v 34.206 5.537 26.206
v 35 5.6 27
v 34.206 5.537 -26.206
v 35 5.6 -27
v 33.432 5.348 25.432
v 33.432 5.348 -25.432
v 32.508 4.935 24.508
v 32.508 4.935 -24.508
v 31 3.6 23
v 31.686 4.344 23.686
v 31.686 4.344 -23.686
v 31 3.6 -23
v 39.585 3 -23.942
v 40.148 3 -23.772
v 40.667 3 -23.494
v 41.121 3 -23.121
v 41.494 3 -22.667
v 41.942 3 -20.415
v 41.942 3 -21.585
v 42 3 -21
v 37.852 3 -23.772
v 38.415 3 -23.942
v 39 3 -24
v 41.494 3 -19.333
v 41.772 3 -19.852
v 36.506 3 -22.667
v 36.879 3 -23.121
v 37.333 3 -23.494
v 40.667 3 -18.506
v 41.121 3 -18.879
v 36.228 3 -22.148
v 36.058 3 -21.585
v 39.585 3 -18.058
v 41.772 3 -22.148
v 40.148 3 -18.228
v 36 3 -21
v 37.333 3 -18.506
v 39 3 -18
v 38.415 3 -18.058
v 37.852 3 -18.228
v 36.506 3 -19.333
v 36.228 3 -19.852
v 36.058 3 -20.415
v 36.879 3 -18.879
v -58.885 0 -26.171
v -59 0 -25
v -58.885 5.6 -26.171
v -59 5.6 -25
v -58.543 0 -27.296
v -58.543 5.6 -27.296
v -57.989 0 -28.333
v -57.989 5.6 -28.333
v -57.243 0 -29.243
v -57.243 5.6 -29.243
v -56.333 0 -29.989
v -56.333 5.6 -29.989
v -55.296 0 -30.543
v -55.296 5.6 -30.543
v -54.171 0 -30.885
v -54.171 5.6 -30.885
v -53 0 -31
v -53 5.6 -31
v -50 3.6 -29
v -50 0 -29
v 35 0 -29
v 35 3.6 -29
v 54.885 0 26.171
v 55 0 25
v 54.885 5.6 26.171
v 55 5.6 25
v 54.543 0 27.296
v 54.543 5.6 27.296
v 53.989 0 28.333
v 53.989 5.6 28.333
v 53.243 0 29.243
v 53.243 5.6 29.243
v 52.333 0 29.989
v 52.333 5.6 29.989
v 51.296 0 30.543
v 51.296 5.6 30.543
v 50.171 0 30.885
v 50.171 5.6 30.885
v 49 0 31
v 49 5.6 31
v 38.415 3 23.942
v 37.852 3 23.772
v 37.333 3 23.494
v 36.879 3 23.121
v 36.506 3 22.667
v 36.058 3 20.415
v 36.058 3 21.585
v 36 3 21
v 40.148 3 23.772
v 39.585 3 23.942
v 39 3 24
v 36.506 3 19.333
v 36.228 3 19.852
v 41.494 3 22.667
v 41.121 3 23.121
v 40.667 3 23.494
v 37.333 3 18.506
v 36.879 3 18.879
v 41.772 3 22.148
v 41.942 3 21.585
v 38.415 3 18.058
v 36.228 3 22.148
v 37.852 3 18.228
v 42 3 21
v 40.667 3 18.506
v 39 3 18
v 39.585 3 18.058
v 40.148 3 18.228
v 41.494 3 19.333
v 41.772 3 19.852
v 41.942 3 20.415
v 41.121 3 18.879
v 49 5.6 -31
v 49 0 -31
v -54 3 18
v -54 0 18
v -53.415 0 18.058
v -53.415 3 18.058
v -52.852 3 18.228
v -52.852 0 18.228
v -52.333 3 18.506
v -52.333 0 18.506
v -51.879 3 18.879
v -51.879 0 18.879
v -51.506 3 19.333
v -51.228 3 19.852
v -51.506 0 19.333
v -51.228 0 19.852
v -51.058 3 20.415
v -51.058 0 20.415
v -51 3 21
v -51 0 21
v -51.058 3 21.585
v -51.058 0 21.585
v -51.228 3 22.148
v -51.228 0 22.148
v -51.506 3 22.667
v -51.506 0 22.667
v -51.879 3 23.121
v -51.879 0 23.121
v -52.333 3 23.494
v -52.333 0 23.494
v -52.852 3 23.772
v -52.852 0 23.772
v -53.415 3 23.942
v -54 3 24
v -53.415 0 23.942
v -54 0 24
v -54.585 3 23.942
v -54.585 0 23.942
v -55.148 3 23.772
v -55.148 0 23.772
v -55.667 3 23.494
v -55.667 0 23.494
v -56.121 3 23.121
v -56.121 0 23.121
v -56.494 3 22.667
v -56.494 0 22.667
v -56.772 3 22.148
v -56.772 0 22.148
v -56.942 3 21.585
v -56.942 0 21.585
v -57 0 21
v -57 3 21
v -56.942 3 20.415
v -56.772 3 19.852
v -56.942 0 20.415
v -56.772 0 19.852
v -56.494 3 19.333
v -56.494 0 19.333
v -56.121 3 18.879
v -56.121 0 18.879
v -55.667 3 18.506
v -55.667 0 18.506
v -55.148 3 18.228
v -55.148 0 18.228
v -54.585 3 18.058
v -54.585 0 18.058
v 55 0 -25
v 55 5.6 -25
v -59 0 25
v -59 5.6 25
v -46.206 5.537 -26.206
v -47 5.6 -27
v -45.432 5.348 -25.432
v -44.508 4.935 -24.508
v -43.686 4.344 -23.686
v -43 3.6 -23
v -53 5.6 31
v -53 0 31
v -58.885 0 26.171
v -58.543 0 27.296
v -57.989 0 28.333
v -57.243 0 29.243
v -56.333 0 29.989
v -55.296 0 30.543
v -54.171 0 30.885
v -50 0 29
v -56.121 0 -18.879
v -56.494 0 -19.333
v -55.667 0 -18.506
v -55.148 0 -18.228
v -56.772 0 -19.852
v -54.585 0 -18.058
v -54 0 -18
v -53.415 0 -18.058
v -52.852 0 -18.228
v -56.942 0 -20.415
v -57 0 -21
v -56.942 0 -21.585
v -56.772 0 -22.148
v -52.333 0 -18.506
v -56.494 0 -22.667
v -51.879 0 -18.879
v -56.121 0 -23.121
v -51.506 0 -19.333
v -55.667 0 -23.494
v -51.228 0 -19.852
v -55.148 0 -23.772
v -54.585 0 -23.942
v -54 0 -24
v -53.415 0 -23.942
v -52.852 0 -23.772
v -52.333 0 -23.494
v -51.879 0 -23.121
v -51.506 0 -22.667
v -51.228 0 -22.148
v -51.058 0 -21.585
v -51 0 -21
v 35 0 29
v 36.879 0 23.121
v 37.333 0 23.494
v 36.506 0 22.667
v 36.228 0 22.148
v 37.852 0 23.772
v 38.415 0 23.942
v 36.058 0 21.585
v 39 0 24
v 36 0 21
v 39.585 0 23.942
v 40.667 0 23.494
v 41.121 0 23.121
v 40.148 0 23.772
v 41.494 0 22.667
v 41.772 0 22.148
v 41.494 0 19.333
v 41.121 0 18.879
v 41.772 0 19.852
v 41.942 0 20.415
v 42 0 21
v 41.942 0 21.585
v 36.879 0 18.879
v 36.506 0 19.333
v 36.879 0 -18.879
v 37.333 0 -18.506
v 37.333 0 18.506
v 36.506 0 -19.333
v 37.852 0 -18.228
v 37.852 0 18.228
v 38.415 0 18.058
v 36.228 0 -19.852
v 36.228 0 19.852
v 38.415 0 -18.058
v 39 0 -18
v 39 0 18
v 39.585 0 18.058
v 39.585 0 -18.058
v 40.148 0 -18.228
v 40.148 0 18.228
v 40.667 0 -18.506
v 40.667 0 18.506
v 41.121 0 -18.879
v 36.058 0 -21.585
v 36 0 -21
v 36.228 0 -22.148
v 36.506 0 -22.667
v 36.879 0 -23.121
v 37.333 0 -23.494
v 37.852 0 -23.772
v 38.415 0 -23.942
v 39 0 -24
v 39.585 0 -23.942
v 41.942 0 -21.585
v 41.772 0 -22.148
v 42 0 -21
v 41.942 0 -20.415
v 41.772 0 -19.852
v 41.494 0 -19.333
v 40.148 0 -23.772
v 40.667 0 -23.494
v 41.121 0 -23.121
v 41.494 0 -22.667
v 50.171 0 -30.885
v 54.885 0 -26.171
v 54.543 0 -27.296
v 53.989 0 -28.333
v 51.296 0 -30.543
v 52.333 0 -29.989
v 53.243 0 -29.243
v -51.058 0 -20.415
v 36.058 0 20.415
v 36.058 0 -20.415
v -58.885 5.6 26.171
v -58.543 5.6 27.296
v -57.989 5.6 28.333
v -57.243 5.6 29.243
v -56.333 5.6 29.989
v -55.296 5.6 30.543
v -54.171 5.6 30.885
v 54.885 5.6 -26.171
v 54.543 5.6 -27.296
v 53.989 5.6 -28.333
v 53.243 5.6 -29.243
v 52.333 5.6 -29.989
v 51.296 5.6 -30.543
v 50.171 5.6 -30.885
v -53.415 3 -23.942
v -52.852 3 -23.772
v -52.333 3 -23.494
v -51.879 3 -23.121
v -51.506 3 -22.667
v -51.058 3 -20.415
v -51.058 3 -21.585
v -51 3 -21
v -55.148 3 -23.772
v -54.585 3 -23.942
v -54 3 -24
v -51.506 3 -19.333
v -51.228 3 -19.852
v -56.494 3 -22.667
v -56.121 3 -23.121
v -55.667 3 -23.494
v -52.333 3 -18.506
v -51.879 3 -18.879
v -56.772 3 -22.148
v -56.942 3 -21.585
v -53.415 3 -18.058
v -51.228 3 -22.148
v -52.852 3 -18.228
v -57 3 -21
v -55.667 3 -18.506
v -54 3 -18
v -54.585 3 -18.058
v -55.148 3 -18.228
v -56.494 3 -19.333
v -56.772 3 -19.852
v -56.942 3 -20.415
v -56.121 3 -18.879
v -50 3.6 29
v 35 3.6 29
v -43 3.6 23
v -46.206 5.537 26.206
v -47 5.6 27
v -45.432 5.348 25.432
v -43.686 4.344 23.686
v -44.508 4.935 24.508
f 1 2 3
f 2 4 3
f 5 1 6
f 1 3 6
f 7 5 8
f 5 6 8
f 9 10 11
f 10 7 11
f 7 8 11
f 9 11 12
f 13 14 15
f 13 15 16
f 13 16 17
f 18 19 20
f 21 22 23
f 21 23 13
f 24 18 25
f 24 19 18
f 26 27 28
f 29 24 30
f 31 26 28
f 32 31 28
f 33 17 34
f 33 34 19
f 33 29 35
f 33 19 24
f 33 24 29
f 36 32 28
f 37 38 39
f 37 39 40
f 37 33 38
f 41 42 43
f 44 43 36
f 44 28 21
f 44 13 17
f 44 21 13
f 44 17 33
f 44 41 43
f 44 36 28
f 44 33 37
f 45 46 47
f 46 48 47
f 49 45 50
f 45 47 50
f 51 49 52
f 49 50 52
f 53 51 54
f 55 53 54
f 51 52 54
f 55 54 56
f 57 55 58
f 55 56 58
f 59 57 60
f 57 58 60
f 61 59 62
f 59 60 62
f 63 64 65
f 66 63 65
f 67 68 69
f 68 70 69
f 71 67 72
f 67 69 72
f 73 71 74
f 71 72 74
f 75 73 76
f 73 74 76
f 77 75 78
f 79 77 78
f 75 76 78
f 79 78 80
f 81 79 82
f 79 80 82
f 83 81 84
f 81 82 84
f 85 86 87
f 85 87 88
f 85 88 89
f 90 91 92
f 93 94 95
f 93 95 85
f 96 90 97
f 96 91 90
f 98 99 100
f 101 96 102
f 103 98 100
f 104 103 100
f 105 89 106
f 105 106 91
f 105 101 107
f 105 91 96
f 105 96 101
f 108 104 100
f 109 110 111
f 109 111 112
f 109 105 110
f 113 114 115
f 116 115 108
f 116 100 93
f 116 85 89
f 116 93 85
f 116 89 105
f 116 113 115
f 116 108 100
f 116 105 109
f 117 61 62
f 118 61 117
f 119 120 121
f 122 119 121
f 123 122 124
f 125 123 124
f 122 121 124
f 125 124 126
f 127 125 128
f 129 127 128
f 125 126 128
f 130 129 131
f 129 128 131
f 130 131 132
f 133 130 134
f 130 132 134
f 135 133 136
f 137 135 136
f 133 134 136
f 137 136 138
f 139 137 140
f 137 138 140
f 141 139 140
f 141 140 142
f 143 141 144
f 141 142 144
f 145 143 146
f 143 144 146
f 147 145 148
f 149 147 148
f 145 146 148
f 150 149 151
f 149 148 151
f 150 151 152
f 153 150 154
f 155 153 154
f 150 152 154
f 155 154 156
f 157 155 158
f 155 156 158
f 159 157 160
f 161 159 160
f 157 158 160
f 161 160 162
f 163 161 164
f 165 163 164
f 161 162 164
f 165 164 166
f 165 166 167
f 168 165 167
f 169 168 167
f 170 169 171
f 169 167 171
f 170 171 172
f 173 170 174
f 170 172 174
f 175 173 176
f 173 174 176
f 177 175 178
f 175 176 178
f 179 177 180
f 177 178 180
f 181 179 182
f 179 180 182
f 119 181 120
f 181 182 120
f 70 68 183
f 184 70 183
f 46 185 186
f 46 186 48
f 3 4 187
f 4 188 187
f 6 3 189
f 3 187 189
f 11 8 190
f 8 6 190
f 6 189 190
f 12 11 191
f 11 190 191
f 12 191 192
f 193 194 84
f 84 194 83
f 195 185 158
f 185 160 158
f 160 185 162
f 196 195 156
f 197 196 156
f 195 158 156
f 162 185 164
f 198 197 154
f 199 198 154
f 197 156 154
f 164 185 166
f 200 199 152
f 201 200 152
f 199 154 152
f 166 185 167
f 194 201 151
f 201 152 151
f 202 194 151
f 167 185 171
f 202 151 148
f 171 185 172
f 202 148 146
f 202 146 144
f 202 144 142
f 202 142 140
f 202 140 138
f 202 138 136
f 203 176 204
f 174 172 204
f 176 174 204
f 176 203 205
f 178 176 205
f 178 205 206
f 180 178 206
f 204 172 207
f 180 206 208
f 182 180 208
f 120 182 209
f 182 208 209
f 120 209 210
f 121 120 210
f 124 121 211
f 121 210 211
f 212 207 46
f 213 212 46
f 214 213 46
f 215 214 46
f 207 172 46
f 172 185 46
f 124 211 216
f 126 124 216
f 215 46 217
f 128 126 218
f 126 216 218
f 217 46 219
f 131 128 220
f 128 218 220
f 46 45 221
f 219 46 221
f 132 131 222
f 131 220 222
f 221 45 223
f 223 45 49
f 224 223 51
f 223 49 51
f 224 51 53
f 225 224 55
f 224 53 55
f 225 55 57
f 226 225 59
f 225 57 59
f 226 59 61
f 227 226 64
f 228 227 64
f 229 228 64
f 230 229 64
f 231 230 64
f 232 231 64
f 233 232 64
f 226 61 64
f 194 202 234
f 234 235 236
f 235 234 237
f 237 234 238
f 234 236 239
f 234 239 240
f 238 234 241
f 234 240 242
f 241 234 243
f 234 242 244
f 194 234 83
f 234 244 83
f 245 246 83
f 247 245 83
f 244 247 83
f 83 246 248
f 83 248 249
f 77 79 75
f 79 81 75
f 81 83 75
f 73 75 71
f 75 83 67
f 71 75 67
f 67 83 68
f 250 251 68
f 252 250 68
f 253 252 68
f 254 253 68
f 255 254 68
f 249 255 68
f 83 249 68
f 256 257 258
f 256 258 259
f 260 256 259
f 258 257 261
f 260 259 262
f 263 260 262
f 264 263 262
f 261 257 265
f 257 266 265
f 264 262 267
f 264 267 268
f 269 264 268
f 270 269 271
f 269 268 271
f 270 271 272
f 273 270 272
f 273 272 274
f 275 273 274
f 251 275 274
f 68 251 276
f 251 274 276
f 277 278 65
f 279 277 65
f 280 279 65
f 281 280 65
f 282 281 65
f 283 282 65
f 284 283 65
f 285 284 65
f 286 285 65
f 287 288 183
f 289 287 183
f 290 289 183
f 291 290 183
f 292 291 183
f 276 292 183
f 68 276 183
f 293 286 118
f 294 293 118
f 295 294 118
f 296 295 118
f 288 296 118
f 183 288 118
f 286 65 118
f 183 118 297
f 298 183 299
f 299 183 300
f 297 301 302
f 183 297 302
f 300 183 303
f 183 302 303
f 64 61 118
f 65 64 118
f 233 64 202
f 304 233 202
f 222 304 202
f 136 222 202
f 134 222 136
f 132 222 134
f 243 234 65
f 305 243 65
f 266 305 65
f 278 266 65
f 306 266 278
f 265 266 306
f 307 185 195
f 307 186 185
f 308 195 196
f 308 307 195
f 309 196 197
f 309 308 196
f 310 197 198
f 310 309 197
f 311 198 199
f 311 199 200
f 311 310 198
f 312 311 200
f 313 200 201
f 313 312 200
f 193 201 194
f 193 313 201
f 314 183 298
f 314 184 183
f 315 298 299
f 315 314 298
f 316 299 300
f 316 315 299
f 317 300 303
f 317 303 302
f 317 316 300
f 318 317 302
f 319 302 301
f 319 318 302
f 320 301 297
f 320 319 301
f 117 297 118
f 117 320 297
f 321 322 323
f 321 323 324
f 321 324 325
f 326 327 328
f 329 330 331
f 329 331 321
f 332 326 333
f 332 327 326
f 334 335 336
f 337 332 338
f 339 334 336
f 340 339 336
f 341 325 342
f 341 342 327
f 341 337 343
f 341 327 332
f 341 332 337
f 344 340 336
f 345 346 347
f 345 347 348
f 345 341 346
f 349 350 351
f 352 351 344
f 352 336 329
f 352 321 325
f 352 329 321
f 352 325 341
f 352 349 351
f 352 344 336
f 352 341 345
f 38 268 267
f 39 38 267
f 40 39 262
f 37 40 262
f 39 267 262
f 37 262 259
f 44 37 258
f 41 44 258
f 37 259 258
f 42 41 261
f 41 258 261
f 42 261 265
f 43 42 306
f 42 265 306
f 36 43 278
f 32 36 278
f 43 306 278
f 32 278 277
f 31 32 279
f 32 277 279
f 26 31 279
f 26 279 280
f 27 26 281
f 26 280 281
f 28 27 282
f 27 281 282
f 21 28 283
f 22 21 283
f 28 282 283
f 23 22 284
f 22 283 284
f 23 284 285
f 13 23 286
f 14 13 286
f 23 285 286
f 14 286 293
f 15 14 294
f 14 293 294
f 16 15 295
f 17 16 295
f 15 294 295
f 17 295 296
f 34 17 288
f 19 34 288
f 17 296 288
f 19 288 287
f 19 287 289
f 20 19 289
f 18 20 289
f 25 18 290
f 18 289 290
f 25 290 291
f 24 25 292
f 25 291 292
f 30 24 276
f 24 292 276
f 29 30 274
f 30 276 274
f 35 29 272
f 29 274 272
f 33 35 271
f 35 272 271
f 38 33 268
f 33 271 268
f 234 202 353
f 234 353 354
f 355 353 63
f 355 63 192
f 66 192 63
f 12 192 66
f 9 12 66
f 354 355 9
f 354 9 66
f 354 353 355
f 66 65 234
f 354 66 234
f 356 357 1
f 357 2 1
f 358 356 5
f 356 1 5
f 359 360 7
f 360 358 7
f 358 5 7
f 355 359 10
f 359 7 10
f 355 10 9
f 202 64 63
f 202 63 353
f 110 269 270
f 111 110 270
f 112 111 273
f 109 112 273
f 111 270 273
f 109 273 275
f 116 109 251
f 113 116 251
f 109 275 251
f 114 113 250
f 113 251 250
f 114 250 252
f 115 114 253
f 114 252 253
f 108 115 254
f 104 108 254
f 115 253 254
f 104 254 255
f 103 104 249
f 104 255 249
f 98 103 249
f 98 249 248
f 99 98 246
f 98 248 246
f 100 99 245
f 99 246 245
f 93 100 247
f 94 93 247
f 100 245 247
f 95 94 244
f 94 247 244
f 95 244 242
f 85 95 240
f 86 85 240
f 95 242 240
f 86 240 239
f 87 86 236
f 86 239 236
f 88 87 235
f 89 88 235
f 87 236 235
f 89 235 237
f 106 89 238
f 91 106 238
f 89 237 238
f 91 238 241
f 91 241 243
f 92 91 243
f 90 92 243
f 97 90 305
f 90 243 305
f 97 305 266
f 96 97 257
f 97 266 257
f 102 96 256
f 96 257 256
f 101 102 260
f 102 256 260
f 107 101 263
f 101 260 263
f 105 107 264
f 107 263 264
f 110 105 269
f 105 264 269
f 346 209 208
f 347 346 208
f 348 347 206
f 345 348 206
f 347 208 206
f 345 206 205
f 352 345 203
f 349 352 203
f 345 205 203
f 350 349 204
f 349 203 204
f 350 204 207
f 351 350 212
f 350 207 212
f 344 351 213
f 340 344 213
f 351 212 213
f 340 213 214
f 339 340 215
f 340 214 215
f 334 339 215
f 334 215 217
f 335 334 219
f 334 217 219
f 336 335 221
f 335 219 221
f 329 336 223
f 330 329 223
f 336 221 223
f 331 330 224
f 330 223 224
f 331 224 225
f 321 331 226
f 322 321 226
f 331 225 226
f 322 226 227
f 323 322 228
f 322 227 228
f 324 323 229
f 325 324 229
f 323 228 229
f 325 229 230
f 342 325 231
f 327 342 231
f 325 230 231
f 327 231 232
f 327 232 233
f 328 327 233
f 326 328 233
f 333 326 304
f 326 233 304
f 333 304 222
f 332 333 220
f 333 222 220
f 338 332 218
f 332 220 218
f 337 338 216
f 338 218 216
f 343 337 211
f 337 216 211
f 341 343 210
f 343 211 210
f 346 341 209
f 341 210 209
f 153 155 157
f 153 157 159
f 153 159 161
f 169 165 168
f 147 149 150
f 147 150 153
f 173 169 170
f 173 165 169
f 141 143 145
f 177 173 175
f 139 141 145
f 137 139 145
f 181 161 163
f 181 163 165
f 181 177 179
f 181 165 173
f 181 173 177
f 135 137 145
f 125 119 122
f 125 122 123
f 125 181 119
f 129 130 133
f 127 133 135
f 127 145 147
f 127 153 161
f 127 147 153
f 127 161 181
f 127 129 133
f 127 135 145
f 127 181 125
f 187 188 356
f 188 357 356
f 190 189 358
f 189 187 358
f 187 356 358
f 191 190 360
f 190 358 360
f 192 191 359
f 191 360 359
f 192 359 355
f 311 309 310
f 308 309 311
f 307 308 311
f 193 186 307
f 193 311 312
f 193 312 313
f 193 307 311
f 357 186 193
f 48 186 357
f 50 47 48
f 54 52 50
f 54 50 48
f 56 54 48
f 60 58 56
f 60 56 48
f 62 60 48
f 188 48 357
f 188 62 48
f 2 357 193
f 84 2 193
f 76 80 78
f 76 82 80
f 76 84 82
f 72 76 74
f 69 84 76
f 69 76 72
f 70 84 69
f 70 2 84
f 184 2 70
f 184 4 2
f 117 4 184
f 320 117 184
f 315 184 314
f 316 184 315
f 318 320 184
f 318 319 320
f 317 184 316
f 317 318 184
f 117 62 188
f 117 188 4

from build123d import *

# Parameters (mm, degrees)
SKETCH_1_W            = 114
SKETCH_1_H            = 62
EXTRUDE_1_DEPTH       = 5.6
SKETCH_5_R            = 3
CUT_EXTRUDE_865_DEPTH = 3
SKETCH_7_W            = 85
SKETCH_7_H            = 58
LCD_DEPTH             = 3.6
SKETCH_13_W           = 74
SKETCH_13_H           = 46
CUT_EXTRUDE_1_DEPTH   = 10
FILLET_2_R            = 5
FILLET_3_R            = 6


with BuildPart() as part:
    # Эскиз1 → Бобышка-Вытянуть1 (new body)
    with BuildSketch(Plane(origin=(0, 0, 0), x_dir=(1, 0, 0), z_dir=(0, 1, 0))):
        with Locations((-2, 0)):
            Rectangle(SKETCH_1_W, SKETCH_1_H)
    extrude(amount=EXTRUDE_1_DEPTH)

    # Эскиз5 → Cut-Extrude 865 (cut)
    with BuildSketch(Plane.XZ):
        with Locations(Location((-54, 21, 0), (0, 0, 270))):
            Circle(SKETCH_5_R)
        with Locations(Location((-54, -21, 0), (0, 0, 90))):
            Circle(SKETCH_5_R)
        with Locations(Location((39, 21, 0), (0, 0, 270))):
            Circle(SKETCH_5_R)
        with Locations(Location((39, -21, 0), (0, 0, 90))):
            Circle(SKETCH_5_R)
    extrude(amount=-CUT_EXTRUDE_865_DEPTH, mode=Mode.SUBTRACT)

    # Эскиз7 → под LCD (cut)
    with BuildSketch(Plane.XZ):
        with Locations((-7.5, 0)):
            Rectangle(SKETCH_7_W, SKETCH_7_H)
    extrude(amount=-LCD_DEPTH, mode=Mode.SUBTRACT)

    # Эскиз13 → Вырез-Вытянуть1 (cut)
    with BuildSketch(Plane.XZ.offset(-3.6)):
        with Locations((-6, 0)):
            Rectangle(SKETCH_13_W, SKETCH_13_H)
    extrude(amount=-CUT_EXTRUDE_1_DEPTH, mode=Mode.SUBTRACT)

    # Скругление2
    # the kernel refuses this fillet: 5 mm, written as the material it takes off along each edge
    with BuildSketch(Plane(origin=(-43, 5.6, 23), x_dir=(-1, 0, 0), z_dir=(0, 0, -1)), Plane(origin=(31, 5.6, -23), x_dir=(1, 0, 0), z_dir=(0, 0, 1))) as fillet_2_piece_1:
        with BuildLine():
            CenterArc((4, -5), FILLET_2_R, 90, 53.130102354)
            Line((0, -2), (-0.08, -1.94))
            ThreePointArc((-0.08, -1.94), (-0.1, -1), (-0.1, 0))
            Line((-0.1, 0), (0, 0.1))
            Line((0, 0.1), (4, 0.1))
            Line((4, 0.1), (4, 0))
        make_face()
    extrude(amount=46, mode=Mode.SUBTRACT)
    with BuildSketch(Plane(origin=(31, 5.6, 23), x_dir=(0, 0, 1), z_dir=(-1, 0, 0)), Plane(origin=(-43, 5.6, -23), x_dir=(0, 0, -1), z_dir=(1, 0, 0))) as fillet_2_piece_2:
        with BuildLine():
            CenterArc((4, -5), FILLET_2_R, 90, 53.130102354)
            Line((0, -2), (-0.08, -1.94))
            ThreePointArc((-0.08, -1.94), (-0.1, -1), (-0.1, 0))
            Line((-0.1, 0), (0, 0.1))
            Line((0, 0.1), (4, 0.1))
            Line((4, 0.1), (4, 0))
        make_face()
    extrude(amount=74, mode=Mode.SUBTRACT)
    with BuildSketch(Plane(origin=(31, 5.6, 23), x_dir=(0, 0, 1), z_dir=(-1, 0, 0))) as fillet_2_piece_3a_section:
        with BuildLine():
            CenterArc((4, -5), FILLET_2_R, 90, 53.130102354)
            Line((0, -2), (-0.08, -1.94))
            ThreePointArc((-0.08, -1.94), (-0.1, -1), (-0.1, 0))
            Line((-0.1, 0), (0, 0.1))
            Line((0, 0.1), (4, 0.1))
            Line((4, 0.1), (4, 0))
        make_face()
    fillet_2_piece_3a = extrude(amount=84, mode=Mode.PRIVATE)
    fillet_2_piece_3a = split(fillet_2_piece_3a, bisect_by=Plane(origin=(-43, 5.088057438, 24.029417057), z_dir=(-1, 0, 0)), keep=Keep.TOP, mode=Mode.PRIVATE)
    with BuildSketch(Plane(origin=(-43, 5.6, 33), x_dir=(-1, 0, 0), z_dir=(0, 0, -1))) as fillet_2_piece_3b_section:
        with BuildLine():
            CenterArc((4, -5), FILLET_2_R, 90, 53.130102354)
            Line((0, -2), (-0.08, -1.94))
            ThreePointArc((-0.08, -1.94), (-0.1, -1), (-0.1, 0))
            Line((-0.1, 0), (0, 0.1))
            Line((0, 0.1), (4, 0.1))
            Line((4, 0.1), (4, 0))
        make_face()
    fillet_2_piece_3b = extrude(amount=56, mode=Mode.PRIVATE)
    fillet_2_piece_3b = split(fillet_2_piece_3b, bisect_by=Plane(origin=(-44.029417057, 5.088057438, 23), z_dir=(0, 0, 1)), keep=Keep.TOP, mode=Mode.PRIVATE)
    fillet_2_piece_3 = fillet_2_piece_3a & fillet_2_piece_3b
    add(fillet_2_piece_3, mode=Mode.SUBTRACT)
    with BuildSketch(Plane(origin=(-43, 5.6, 23), x_dir=(-1, 0, 0), z_dir=(0, 0, -1))) as fillet_2_piece_4a_section:
        with BuildLine():
            CenterArc((4, -5), FILLET_2_R, 90, 53.130102354)
            Line((0, -2), (-0.08, -1.94))
            ThreePointArc((-0.08, -1.94), (-0.1, -1), (-0.1, 0))
            Line((-0.1, 0), (0, 0.1))
            Line((0, 0.1), (4, 0.1))
            Line((4, 0.1), (4, 0))
        make_face()
    fillet_2_piece_4a = extrude(amount=56, mode=Mode.PRIVATE)
    fillet_2_piece_4a = split(fillet_2_piece_4a, bisect_by=Plane(origin=(-44.029417057, 5.088057438, -23), z_dir=(0, 0, -1)), keep=Keep.TOP, mode=Mode.PRIVATE)
    with BuildSketch(Plane(origin=(-53, 5.6, -23), x_dir=(0, 0, -1), z_dir=(1, 0, 0))) as fillet_2_piece_4b_section:
        with BuildLine():
            CenterArc((4, -5), FILLET_2_R, 90, 53.130102354)
            Line((0, -2), (-0.08, -1.94))
            ThreePointArc((-0.08, -1.94), (-0.1, -1), (-0.1, 0))
            Line((-0.1, 0), (0, 0.1))
            Line((0, 0.1), (4, 0.1))
            Line((4, 0.1), (4, 0))
        make_face()
    fillet_2_piece_4b = extrude(amount=84, mode=Mode.PRIVATE)
    fillet_2_piece_4b = split(fillet_2_piece_4b, bisect_by=Plane(origin=(-43, 5.088057438, -24.029417057), z_dir=(-1, 0, 0)), keep=Keep.TOP, mode=Mode.PRIVATE)
    fillet_2_piece_4 = fillet_2_piece_4a & fillet_2_piece_4b
    add(fillet_2_piece_4, mode=Mode.SUBTRACT)
    with BuildSketch(Plane(origin=(41, 5.6, 23), x_dir=(0, 0, 1), z_dir=(-1, 0, 0))) as fillet_2_piece_5a_section:
        with BuildLine():
            CenterArc((4, -5), FILLET_2_R, 90, 53.130102354)
            Line((0, -2), (-0.08, -1.94))
            ThreePointArc((-0.08, -1.94), (-0.1, -1), (-0.1, 0))
            Line((-0.1, 0), (0, 0.1))
            Line((0, 0.1), (4, 0.1))
            Line((4, 0.1), (4, 0))
        make_face()
    fillet_2_piece_5a = extrude(amount=84, mode=Mode.PRIVATE)
    fillet_2_piece_5a = split(fillet_2_piece_5a, bisect_by=Plane(origin=(31, 5.088057438, 24.029417057), z_dir=(1, 0, 0)), keep=Keep.TOP, mode=Mode.PRIVATE)
    with BuildSketch(Plane(origin=(31, 5.6, -23), x_dir=(1, 0, 0), z_dir=(0, 0, 1))) as fillet_2_piece_5b_section:
        with BuildLine():
            CenterArc((4, -5), FILLET_2_R, 90, 53.130102354)
            Line((0, -2), (-0.08, -1.94))
            ThreePointArc((-0.08, -1.94), (-0.1, -1), (-0.1, 0))
            Line((-0.1, 0), (0, 0.1))
            Line((0, 0.1), (4, 0.1))
            Line((4, 0.1), (4, 0))
        make_face()
    fillet_2_piece_5b = extrude(amount=56, mode=Mode.PRIVATE)
    fillet_2_piece_5b = split(fillet_2_piece_5b, bisect_by=Plane(origin=(32.029417057, 5.088057438, 23), z_dir=(0, 0, 1)), keep=Keep.TOP, mode=Mode.PRIVATE)
    fillet_2_piece_5 = fillet_2_piece_5a & fillet_2_piece_5b
    add(fillet_2_piece_5, mode=Mode.SUBTRACT)
    with BuildSketch(Plane(origin=(-43, 5.6, -23), x_dir=(0, 0, -1), z_dir=(1, 0, 0))) as fillet_2_piece_6a_section:
        with BuildLine():
            CenterArc((4, -5), FILLET_2_R, 90, 53.130102354)
            Line((0, -2), (-0.08, -1.94))
            ThreePointArc((-0.08, -1.94), (-0.1, -1), (-0.1, 0))
            Line((-0.1, 0), (0, 0.1))
            Line((0, 0.1), (4, 0.1))
            Line((4, 0.1), (4, 0))
        make_face()
    fillet_2_piece_6a = extrude(amount=84, mode=Mode.PRIVATE)
    fillet_2_piece_6a = split(fillet_2_piece_6a, bisect_by=Plane(origin=(31, 5.088057438, -24.029417057), z_dir=(1, 0, 0)), keep=Keep.TOP, mode=Mode.PRIVATE)
    with BuildSketch(Plane(origin=(31, 5.6, -33), x_dir=(1, 0, 0), z_dir=(0, 0, 1))) as fillet_2_piece_6b_section:
        with BuildLine():
            CenterArc((4, -5), FILLET_2_R, 90, 53.130102354)
            Line((0, -2), (-0.08, -1.94))
            ThreePointArc((-0.08, -1.94), (-0.1, -1), (-0.1, 0))
            Line((-0.1, 0), (0, 0.1))
            Line((0, 0.1), (4, 0.1))
            Line((4, 0.1), (4, 0))
        make_face()
    fillet_2_piece_6b = extrude(amount=56, mode=Mode.PRIVATE)
    fillet_2_piece_6b = split(fillet_2_piece_6b, bisect_by=Plane(origin=(32.029417057, 5.088057438, -23), z_dir=(0, 0, -1)), keep=Keep.TOP, mode=Mode.PRIVATE)
    fillet_2_piece_6 = fillet_2_piece_6a & fillet_2_piece_6b
    add(fillet_2_piece_6, mode=Mode.SUBTRACT)

    # Скругление3
    fillet_3_edges = [part.edges().sort_by_distance(p)[0] for p in [
        (55, 2.8, 31),
        (-59, 2.8, 31),
        (-59, 2.8, -31),
        (55, 2.8, -31),
    ]]
    fillet(fillet_3_edges, radius=FILLET_3_R)


solid = part.part
